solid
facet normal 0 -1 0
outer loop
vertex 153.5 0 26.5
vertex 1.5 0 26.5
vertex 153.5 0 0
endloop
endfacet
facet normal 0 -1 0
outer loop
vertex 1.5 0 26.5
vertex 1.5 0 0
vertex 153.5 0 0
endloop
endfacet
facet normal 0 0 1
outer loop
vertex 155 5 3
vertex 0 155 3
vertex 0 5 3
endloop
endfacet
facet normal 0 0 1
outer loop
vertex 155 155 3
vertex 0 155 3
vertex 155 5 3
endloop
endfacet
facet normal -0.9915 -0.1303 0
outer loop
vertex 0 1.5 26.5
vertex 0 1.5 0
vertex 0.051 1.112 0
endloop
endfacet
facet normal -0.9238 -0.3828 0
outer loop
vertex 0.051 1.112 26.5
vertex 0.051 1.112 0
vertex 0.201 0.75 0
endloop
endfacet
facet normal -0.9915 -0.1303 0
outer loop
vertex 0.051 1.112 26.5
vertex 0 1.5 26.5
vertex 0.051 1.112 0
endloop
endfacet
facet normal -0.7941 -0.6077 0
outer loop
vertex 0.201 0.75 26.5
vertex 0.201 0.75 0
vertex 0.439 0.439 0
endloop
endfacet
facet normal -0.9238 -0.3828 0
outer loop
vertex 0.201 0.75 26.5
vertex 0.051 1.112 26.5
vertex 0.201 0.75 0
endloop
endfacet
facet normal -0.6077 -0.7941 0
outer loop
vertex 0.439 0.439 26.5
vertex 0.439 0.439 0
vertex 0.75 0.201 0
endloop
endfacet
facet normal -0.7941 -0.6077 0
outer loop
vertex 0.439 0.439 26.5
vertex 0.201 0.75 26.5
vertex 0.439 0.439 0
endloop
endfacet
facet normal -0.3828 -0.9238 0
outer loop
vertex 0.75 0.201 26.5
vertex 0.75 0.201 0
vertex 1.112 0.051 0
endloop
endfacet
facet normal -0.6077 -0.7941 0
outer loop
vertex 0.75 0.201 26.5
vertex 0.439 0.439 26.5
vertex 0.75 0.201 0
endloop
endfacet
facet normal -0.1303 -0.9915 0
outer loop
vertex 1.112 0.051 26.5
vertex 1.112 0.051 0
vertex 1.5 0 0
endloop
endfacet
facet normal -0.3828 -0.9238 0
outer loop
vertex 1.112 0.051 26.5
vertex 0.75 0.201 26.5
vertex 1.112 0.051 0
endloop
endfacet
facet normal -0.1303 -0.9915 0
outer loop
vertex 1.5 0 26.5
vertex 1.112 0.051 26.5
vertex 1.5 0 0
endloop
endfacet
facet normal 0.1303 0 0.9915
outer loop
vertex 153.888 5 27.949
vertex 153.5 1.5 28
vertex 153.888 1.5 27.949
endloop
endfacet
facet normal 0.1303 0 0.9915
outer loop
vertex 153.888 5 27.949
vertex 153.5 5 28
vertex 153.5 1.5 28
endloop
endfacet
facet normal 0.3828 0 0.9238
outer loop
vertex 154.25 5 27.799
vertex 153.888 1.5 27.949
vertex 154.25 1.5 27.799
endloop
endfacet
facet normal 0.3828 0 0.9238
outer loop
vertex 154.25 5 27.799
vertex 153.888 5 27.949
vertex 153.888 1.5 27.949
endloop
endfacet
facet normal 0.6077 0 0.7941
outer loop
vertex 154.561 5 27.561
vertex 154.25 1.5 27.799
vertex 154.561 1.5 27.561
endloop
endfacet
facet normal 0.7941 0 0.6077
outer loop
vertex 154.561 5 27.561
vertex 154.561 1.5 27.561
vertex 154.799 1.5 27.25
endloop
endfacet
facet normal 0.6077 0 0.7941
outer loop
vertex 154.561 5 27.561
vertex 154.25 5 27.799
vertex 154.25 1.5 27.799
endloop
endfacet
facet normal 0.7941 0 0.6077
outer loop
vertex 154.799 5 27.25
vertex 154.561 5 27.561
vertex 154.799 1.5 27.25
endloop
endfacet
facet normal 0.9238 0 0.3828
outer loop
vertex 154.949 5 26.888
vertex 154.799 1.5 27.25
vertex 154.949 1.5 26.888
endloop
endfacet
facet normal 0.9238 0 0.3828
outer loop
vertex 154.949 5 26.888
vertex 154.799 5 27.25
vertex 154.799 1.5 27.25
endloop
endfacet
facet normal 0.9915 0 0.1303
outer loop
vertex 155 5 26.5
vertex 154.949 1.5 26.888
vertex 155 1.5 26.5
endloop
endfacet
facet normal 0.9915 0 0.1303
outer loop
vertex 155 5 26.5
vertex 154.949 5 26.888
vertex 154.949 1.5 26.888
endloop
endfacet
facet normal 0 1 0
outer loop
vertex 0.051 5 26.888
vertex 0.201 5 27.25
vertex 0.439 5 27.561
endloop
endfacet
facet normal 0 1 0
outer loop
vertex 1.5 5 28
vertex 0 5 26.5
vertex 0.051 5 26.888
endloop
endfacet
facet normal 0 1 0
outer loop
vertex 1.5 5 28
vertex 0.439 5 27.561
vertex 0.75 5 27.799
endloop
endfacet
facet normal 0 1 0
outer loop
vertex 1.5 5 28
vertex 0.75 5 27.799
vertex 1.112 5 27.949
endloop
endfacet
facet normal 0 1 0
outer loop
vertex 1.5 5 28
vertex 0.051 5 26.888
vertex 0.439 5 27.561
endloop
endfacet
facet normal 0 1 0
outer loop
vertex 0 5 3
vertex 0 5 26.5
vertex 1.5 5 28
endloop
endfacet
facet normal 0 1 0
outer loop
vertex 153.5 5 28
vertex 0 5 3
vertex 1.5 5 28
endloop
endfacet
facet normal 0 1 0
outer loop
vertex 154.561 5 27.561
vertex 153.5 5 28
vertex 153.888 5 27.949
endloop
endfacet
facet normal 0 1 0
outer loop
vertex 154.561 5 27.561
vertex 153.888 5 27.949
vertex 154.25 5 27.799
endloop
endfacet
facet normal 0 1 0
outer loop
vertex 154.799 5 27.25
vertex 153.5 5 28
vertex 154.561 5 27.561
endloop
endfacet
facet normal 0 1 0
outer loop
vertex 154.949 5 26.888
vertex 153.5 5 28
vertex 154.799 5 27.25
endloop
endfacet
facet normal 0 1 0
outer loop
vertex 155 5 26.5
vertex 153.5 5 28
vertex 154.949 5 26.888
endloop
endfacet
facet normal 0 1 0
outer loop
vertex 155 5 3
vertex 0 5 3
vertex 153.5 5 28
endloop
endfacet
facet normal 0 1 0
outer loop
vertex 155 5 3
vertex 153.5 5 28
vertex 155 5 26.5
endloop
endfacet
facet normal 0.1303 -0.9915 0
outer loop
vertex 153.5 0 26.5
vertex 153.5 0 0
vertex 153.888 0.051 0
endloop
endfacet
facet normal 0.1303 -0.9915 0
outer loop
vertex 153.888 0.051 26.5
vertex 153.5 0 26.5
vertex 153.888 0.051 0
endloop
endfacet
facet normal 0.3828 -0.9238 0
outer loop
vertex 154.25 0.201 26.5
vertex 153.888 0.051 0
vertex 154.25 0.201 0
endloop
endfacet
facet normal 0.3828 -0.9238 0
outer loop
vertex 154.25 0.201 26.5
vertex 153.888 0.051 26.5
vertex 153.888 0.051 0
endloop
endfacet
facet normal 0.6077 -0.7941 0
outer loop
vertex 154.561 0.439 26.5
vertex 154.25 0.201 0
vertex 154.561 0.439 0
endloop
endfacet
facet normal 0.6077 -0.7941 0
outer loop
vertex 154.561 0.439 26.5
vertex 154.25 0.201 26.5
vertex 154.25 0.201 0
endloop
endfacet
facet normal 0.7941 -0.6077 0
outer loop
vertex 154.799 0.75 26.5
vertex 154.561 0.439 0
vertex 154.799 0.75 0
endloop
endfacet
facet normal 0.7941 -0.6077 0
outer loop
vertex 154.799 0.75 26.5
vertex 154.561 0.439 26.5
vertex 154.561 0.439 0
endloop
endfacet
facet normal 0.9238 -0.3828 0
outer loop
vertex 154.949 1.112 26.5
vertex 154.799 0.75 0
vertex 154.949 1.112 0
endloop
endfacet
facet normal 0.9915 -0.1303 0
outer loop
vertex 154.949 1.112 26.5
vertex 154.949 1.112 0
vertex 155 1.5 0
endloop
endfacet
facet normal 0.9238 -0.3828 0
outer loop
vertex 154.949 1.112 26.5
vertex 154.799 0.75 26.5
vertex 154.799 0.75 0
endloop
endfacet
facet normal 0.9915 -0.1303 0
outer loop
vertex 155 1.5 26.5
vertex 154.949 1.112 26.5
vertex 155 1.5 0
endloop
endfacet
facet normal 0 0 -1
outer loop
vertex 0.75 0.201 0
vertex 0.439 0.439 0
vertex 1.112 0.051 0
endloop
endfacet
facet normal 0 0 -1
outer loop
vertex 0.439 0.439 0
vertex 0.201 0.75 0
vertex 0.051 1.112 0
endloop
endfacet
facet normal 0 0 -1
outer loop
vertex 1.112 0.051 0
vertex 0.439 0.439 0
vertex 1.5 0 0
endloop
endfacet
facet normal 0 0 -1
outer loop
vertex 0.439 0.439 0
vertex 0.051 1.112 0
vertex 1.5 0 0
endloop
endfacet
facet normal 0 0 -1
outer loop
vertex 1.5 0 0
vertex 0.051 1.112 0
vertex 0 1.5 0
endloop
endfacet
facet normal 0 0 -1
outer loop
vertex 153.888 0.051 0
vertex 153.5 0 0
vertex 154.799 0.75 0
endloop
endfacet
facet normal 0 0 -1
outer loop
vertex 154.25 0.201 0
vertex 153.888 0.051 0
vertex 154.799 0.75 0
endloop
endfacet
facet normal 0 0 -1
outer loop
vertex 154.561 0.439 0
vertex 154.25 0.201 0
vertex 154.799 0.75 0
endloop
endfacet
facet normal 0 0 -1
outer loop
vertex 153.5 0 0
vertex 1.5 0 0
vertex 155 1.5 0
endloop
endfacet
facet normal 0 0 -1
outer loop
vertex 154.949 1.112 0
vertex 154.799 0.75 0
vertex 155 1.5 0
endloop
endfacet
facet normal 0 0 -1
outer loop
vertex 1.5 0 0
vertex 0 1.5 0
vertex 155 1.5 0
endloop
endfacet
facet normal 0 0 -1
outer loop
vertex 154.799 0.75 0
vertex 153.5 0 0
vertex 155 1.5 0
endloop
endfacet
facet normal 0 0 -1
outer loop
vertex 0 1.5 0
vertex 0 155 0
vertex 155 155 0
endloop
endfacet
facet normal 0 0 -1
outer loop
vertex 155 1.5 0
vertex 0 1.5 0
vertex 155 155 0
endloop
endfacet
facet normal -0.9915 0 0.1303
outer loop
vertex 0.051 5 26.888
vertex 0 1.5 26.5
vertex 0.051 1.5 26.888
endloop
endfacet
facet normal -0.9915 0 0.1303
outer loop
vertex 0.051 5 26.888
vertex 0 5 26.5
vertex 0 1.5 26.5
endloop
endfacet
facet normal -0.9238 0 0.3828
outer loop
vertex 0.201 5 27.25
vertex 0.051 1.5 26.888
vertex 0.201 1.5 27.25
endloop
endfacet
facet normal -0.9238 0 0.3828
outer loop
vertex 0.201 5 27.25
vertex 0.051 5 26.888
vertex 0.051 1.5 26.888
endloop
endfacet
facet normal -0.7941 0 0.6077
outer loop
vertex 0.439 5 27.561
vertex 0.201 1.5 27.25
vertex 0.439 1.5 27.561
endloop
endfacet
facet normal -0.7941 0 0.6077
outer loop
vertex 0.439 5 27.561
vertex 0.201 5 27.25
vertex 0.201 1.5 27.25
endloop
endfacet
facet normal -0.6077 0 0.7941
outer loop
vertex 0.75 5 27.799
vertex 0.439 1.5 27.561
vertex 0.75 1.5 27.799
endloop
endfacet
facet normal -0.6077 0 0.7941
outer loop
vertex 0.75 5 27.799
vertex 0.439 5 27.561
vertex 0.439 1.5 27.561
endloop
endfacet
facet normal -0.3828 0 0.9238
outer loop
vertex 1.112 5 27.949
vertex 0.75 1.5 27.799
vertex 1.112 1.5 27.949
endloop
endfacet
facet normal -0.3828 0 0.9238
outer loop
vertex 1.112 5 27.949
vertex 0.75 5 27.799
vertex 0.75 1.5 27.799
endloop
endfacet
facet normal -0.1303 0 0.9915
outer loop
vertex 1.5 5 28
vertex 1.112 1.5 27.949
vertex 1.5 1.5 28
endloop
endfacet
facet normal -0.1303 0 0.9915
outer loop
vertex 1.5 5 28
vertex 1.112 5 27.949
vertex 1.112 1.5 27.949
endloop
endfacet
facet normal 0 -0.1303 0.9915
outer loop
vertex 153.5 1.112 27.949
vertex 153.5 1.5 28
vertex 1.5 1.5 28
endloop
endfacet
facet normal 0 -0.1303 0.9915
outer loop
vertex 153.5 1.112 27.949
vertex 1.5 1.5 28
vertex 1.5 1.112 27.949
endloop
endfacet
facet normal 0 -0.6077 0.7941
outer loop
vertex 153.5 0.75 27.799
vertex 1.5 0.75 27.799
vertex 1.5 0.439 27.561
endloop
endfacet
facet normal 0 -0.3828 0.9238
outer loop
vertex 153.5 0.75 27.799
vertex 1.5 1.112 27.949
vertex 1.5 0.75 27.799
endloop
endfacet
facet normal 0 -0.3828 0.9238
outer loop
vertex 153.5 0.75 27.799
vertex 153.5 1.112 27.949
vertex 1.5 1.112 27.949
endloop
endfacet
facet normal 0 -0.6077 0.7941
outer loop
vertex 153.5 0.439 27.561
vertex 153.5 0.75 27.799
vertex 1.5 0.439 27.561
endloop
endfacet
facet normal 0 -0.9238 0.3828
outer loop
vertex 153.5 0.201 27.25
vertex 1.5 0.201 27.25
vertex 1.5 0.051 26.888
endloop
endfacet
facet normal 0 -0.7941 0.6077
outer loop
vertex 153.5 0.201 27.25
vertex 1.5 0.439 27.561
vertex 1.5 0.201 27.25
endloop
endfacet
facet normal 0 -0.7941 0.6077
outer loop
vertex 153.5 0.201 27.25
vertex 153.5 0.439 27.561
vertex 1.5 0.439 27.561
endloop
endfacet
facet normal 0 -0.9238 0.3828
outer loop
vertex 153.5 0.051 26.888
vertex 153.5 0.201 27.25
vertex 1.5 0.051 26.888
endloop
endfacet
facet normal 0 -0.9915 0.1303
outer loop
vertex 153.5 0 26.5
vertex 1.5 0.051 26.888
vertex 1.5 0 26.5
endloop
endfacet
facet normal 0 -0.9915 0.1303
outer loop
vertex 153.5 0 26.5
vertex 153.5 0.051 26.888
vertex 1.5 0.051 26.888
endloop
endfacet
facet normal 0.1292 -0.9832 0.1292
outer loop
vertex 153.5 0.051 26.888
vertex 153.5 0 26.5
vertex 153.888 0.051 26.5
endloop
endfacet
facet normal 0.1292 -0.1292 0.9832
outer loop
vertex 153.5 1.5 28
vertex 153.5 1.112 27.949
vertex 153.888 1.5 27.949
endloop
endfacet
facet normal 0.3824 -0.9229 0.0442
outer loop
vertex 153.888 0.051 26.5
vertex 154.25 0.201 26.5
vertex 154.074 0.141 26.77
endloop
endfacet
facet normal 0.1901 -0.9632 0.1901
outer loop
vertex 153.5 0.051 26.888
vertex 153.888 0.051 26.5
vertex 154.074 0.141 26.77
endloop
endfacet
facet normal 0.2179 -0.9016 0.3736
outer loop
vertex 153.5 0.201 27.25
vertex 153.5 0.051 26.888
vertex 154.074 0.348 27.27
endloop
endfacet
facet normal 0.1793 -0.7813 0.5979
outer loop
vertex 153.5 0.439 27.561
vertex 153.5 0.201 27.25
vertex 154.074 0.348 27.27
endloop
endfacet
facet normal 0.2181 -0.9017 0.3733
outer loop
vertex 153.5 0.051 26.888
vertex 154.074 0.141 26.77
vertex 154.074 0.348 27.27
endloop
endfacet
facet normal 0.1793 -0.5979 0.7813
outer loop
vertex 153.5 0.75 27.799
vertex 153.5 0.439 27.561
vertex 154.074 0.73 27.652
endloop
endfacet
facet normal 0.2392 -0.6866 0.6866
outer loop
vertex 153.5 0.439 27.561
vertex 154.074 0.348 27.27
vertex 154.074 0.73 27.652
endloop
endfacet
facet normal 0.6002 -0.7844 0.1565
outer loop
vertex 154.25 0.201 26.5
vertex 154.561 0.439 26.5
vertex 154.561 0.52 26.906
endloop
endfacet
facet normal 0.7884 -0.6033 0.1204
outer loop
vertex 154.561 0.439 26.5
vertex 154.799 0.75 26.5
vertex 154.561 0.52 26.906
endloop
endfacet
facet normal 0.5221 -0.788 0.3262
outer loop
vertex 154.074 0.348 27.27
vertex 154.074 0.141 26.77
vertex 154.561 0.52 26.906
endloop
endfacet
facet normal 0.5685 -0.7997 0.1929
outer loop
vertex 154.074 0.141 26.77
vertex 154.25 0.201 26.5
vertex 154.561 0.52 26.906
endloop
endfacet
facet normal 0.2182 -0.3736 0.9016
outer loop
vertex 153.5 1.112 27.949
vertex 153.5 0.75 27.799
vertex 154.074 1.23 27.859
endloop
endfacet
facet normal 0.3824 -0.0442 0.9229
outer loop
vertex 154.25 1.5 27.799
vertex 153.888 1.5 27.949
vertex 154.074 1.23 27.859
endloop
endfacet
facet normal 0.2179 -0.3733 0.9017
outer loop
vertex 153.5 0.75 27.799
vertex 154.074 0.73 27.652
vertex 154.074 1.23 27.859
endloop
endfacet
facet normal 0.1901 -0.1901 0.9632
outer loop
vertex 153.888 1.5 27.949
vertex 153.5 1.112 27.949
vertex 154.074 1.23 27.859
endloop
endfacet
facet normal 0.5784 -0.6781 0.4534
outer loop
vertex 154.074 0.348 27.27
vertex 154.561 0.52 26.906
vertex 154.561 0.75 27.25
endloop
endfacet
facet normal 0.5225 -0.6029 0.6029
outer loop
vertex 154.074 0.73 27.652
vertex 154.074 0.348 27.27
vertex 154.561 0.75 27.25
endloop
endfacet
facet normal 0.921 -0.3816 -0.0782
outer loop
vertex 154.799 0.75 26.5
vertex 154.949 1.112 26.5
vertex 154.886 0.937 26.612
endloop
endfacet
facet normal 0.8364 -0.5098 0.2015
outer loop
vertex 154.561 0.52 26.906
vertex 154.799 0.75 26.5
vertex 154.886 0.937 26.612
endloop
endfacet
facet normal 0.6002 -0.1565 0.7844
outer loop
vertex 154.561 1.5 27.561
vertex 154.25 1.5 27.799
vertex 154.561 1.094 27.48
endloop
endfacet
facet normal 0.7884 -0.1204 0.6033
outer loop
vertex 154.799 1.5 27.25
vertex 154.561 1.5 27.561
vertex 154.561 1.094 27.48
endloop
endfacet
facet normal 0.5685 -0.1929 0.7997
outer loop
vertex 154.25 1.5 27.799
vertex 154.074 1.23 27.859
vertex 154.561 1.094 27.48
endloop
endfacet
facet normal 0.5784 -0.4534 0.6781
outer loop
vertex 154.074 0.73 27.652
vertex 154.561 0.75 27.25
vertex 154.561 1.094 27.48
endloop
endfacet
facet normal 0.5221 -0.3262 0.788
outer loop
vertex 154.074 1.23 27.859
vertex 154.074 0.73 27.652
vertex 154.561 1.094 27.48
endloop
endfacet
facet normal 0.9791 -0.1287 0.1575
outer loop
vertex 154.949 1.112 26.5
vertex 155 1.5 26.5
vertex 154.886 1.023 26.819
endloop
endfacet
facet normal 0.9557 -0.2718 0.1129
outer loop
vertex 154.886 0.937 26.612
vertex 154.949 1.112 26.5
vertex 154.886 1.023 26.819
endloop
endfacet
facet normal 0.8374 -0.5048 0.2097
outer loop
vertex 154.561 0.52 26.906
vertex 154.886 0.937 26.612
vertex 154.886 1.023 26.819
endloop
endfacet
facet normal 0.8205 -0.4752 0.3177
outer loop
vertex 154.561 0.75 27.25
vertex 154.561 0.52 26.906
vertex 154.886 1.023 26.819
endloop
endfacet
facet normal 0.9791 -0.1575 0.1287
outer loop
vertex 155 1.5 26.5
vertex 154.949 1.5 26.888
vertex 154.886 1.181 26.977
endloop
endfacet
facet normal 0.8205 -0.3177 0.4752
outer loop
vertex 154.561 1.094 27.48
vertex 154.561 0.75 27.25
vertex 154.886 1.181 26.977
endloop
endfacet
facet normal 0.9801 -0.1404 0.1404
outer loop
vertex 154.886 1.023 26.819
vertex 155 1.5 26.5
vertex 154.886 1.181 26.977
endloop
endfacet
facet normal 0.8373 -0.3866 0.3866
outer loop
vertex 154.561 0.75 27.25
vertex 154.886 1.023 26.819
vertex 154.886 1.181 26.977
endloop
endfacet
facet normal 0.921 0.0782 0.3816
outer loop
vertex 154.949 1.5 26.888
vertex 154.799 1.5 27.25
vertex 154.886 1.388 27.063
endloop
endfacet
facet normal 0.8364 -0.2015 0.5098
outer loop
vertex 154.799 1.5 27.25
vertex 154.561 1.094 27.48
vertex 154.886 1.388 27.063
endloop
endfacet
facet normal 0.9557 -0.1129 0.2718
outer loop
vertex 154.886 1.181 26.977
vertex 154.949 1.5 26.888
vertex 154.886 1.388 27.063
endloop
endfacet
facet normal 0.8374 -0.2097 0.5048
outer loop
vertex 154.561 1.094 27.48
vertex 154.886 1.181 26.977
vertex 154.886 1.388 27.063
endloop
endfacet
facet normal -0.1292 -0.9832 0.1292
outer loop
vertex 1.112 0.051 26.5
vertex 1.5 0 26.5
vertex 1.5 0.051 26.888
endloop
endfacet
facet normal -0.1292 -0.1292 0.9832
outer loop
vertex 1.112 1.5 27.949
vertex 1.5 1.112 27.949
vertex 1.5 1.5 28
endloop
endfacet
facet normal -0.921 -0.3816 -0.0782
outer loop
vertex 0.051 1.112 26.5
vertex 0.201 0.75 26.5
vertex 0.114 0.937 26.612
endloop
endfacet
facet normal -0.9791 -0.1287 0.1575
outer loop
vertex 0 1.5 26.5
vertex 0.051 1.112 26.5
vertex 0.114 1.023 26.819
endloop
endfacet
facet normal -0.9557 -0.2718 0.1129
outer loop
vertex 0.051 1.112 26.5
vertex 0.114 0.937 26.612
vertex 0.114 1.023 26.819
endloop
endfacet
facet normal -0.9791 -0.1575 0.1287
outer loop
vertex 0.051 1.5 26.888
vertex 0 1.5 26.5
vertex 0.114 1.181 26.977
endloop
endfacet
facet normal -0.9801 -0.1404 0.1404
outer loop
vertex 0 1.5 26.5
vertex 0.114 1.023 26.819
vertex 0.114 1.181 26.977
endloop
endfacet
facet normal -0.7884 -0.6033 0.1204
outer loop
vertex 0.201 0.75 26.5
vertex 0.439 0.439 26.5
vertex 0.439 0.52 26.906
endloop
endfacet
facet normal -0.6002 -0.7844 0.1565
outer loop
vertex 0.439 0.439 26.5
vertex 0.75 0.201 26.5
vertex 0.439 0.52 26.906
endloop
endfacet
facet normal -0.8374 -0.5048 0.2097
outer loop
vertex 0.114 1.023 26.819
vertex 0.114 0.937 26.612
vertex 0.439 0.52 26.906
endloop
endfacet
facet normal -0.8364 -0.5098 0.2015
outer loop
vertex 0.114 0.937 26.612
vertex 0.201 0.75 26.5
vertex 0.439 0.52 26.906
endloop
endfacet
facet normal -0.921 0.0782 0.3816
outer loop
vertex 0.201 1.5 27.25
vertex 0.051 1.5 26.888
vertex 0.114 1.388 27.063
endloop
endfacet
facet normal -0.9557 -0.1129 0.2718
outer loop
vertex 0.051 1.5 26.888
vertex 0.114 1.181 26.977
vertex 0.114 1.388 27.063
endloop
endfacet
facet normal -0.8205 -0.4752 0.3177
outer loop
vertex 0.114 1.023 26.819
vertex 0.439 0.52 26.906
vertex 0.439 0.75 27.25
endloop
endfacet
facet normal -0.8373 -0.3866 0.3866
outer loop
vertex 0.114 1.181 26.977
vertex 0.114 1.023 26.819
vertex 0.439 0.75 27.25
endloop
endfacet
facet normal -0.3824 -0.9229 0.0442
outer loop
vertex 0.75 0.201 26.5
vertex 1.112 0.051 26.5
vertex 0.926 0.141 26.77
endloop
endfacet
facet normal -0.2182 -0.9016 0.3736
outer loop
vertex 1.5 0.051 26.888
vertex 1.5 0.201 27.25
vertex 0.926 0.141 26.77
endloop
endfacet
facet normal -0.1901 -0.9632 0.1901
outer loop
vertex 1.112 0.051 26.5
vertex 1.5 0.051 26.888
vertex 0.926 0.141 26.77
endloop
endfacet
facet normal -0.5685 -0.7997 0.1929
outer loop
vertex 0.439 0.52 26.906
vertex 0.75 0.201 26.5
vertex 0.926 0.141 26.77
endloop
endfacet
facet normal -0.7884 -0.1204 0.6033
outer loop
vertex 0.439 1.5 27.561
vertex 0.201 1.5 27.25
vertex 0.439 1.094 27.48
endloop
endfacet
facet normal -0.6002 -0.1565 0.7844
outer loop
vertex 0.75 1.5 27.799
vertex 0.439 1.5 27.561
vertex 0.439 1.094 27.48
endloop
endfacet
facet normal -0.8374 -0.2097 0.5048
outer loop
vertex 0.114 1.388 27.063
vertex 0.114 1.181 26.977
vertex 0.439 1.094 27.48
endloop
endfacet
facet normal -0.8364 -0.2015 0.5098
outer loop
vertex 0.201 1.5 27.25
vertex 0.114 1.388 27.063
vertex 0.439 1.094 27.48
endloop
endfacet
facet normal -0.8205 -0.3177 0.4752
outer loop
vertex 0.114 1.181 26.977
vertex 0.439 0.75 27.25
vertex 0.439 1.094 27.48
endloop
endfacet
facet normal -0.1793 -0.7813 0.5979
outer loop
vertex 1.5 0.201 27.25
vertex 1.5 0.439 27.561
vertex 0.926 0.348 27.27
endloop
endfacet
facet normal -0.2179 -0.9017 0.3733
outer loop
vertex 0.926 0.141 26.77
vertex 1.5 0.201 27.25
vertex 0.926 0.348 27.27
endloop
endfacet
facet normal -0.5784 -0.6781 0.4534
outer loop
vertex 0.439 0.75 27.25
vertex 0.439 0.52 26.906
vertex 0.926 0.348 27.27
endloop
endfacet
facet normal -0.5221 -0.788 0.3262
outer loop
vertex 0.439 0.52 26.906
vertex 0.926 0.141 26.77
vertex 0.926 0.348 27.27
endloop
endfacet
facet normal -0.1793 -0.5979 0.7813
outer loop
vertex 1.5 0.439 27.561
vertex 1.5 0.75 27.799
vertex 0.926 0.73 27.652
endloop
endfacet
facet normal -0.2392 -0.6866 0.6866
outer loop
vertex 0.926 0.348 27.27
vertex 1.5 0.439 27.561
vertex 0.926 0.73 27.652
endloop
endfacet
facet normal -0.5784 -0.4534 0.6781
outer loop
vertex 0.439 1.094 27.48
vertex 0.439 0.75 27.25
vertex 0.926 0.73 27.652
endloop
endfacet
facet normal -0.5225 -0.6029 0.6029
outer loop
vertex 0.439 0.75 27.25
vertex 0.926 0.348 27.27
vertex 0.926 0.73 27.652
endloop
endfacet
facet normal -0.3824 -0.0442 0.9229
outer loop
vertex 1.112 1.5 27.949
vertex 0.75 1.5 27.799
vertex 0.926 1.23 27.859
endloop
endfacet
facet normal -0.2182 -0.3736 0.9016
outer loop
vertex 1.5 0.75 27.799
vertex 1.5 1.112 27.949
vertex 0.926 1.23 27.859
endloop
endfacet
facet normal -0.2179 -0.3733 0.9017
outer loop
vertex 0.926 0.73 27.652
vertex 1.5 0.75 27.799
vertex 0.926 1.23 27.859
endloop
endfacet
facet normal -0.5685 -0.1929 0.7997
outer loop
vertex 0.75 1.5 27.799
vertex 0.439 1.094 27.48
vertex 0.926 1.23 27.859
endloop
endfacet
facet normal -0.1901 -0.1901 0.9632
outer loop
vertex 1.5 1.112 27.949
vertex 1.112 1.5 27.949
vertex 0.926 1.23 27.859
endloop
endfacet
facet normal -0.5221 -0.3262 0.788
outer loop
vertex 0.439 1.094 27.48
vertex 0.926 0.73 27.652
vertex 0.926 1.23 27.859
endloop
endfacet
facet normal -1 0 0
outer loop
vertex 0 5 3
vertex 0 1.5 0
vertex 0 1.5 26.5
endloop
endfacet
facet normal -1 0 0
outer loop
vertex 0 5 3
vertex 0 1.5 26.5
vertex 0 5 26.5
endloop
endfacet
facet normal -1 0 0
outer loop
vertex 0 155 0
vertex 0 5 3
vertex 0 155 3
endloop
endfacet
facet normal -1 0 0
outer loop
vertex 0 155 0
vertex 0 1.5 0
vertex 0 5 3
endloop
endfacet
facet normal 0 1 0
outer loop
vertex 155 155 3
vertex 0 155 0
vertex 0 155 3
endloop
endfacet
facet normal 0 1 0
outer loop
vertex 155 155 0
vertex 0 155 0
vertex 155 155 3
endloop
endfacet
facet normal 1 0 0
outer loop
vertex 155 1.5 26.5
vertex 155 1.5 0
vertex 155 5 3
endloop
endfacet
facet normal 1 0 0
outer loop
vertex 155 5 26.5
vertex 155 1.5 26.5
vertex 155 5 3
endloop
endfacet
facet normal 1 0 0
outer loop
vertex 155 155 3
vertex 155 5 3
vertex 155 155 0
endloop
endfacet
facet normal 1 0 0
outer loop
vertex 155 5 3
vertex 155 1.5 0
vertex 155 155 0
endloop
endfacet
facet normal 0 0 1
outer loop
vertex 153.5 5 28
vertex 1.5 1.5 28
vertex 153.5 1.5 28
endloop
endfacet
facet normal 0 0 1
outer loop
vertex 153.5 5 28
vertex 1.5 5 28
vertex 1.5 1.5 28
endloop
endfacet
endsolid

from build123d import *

# Parameters (mm, degrees)
F0_W     = 155
F0_H     = 5
F1_DEPTH = 28
F0_H_2   = 150
F2_DEPTH = 3
F3_R     = 1.5
F4_R     = 1.5


with BuildPart() as f1:
    # F0 (on Top) → F1 (new body)
    with BuildSketch(Plane.XY):
        with Locations((77.5, 2.5)):
            Rectangle(F0_W, F0_H)
    extrude(amount=F1_DEPTH)

    # F0 (on Top) → F2 (join)
    with BuildSketch(Plane.XY):
        with Locations((77.5, 2.5)):
            Rectangle(F0_W, F0_H)
        with Locations((77.5, 80)):
            Rectangle(F0_W, F0_H_2)
    extrude(amount=F2_DEPTH)

    # F3
    f3_edges = [f1.edges().sort_by_distance(p)[0] for p in [
        (77.5, 0, 28),
    ]]
    fillet(f3_edges, radius=F3_R)

    # F4
    f4_edges = [f1.edges().sort_by_distance(p)[0] for p in [
        (0, 0, 13.25),
        (155, 0, 13.25),
    ]]
    fillet(f4_edges, radius=F4_R)


solid = f1.part
